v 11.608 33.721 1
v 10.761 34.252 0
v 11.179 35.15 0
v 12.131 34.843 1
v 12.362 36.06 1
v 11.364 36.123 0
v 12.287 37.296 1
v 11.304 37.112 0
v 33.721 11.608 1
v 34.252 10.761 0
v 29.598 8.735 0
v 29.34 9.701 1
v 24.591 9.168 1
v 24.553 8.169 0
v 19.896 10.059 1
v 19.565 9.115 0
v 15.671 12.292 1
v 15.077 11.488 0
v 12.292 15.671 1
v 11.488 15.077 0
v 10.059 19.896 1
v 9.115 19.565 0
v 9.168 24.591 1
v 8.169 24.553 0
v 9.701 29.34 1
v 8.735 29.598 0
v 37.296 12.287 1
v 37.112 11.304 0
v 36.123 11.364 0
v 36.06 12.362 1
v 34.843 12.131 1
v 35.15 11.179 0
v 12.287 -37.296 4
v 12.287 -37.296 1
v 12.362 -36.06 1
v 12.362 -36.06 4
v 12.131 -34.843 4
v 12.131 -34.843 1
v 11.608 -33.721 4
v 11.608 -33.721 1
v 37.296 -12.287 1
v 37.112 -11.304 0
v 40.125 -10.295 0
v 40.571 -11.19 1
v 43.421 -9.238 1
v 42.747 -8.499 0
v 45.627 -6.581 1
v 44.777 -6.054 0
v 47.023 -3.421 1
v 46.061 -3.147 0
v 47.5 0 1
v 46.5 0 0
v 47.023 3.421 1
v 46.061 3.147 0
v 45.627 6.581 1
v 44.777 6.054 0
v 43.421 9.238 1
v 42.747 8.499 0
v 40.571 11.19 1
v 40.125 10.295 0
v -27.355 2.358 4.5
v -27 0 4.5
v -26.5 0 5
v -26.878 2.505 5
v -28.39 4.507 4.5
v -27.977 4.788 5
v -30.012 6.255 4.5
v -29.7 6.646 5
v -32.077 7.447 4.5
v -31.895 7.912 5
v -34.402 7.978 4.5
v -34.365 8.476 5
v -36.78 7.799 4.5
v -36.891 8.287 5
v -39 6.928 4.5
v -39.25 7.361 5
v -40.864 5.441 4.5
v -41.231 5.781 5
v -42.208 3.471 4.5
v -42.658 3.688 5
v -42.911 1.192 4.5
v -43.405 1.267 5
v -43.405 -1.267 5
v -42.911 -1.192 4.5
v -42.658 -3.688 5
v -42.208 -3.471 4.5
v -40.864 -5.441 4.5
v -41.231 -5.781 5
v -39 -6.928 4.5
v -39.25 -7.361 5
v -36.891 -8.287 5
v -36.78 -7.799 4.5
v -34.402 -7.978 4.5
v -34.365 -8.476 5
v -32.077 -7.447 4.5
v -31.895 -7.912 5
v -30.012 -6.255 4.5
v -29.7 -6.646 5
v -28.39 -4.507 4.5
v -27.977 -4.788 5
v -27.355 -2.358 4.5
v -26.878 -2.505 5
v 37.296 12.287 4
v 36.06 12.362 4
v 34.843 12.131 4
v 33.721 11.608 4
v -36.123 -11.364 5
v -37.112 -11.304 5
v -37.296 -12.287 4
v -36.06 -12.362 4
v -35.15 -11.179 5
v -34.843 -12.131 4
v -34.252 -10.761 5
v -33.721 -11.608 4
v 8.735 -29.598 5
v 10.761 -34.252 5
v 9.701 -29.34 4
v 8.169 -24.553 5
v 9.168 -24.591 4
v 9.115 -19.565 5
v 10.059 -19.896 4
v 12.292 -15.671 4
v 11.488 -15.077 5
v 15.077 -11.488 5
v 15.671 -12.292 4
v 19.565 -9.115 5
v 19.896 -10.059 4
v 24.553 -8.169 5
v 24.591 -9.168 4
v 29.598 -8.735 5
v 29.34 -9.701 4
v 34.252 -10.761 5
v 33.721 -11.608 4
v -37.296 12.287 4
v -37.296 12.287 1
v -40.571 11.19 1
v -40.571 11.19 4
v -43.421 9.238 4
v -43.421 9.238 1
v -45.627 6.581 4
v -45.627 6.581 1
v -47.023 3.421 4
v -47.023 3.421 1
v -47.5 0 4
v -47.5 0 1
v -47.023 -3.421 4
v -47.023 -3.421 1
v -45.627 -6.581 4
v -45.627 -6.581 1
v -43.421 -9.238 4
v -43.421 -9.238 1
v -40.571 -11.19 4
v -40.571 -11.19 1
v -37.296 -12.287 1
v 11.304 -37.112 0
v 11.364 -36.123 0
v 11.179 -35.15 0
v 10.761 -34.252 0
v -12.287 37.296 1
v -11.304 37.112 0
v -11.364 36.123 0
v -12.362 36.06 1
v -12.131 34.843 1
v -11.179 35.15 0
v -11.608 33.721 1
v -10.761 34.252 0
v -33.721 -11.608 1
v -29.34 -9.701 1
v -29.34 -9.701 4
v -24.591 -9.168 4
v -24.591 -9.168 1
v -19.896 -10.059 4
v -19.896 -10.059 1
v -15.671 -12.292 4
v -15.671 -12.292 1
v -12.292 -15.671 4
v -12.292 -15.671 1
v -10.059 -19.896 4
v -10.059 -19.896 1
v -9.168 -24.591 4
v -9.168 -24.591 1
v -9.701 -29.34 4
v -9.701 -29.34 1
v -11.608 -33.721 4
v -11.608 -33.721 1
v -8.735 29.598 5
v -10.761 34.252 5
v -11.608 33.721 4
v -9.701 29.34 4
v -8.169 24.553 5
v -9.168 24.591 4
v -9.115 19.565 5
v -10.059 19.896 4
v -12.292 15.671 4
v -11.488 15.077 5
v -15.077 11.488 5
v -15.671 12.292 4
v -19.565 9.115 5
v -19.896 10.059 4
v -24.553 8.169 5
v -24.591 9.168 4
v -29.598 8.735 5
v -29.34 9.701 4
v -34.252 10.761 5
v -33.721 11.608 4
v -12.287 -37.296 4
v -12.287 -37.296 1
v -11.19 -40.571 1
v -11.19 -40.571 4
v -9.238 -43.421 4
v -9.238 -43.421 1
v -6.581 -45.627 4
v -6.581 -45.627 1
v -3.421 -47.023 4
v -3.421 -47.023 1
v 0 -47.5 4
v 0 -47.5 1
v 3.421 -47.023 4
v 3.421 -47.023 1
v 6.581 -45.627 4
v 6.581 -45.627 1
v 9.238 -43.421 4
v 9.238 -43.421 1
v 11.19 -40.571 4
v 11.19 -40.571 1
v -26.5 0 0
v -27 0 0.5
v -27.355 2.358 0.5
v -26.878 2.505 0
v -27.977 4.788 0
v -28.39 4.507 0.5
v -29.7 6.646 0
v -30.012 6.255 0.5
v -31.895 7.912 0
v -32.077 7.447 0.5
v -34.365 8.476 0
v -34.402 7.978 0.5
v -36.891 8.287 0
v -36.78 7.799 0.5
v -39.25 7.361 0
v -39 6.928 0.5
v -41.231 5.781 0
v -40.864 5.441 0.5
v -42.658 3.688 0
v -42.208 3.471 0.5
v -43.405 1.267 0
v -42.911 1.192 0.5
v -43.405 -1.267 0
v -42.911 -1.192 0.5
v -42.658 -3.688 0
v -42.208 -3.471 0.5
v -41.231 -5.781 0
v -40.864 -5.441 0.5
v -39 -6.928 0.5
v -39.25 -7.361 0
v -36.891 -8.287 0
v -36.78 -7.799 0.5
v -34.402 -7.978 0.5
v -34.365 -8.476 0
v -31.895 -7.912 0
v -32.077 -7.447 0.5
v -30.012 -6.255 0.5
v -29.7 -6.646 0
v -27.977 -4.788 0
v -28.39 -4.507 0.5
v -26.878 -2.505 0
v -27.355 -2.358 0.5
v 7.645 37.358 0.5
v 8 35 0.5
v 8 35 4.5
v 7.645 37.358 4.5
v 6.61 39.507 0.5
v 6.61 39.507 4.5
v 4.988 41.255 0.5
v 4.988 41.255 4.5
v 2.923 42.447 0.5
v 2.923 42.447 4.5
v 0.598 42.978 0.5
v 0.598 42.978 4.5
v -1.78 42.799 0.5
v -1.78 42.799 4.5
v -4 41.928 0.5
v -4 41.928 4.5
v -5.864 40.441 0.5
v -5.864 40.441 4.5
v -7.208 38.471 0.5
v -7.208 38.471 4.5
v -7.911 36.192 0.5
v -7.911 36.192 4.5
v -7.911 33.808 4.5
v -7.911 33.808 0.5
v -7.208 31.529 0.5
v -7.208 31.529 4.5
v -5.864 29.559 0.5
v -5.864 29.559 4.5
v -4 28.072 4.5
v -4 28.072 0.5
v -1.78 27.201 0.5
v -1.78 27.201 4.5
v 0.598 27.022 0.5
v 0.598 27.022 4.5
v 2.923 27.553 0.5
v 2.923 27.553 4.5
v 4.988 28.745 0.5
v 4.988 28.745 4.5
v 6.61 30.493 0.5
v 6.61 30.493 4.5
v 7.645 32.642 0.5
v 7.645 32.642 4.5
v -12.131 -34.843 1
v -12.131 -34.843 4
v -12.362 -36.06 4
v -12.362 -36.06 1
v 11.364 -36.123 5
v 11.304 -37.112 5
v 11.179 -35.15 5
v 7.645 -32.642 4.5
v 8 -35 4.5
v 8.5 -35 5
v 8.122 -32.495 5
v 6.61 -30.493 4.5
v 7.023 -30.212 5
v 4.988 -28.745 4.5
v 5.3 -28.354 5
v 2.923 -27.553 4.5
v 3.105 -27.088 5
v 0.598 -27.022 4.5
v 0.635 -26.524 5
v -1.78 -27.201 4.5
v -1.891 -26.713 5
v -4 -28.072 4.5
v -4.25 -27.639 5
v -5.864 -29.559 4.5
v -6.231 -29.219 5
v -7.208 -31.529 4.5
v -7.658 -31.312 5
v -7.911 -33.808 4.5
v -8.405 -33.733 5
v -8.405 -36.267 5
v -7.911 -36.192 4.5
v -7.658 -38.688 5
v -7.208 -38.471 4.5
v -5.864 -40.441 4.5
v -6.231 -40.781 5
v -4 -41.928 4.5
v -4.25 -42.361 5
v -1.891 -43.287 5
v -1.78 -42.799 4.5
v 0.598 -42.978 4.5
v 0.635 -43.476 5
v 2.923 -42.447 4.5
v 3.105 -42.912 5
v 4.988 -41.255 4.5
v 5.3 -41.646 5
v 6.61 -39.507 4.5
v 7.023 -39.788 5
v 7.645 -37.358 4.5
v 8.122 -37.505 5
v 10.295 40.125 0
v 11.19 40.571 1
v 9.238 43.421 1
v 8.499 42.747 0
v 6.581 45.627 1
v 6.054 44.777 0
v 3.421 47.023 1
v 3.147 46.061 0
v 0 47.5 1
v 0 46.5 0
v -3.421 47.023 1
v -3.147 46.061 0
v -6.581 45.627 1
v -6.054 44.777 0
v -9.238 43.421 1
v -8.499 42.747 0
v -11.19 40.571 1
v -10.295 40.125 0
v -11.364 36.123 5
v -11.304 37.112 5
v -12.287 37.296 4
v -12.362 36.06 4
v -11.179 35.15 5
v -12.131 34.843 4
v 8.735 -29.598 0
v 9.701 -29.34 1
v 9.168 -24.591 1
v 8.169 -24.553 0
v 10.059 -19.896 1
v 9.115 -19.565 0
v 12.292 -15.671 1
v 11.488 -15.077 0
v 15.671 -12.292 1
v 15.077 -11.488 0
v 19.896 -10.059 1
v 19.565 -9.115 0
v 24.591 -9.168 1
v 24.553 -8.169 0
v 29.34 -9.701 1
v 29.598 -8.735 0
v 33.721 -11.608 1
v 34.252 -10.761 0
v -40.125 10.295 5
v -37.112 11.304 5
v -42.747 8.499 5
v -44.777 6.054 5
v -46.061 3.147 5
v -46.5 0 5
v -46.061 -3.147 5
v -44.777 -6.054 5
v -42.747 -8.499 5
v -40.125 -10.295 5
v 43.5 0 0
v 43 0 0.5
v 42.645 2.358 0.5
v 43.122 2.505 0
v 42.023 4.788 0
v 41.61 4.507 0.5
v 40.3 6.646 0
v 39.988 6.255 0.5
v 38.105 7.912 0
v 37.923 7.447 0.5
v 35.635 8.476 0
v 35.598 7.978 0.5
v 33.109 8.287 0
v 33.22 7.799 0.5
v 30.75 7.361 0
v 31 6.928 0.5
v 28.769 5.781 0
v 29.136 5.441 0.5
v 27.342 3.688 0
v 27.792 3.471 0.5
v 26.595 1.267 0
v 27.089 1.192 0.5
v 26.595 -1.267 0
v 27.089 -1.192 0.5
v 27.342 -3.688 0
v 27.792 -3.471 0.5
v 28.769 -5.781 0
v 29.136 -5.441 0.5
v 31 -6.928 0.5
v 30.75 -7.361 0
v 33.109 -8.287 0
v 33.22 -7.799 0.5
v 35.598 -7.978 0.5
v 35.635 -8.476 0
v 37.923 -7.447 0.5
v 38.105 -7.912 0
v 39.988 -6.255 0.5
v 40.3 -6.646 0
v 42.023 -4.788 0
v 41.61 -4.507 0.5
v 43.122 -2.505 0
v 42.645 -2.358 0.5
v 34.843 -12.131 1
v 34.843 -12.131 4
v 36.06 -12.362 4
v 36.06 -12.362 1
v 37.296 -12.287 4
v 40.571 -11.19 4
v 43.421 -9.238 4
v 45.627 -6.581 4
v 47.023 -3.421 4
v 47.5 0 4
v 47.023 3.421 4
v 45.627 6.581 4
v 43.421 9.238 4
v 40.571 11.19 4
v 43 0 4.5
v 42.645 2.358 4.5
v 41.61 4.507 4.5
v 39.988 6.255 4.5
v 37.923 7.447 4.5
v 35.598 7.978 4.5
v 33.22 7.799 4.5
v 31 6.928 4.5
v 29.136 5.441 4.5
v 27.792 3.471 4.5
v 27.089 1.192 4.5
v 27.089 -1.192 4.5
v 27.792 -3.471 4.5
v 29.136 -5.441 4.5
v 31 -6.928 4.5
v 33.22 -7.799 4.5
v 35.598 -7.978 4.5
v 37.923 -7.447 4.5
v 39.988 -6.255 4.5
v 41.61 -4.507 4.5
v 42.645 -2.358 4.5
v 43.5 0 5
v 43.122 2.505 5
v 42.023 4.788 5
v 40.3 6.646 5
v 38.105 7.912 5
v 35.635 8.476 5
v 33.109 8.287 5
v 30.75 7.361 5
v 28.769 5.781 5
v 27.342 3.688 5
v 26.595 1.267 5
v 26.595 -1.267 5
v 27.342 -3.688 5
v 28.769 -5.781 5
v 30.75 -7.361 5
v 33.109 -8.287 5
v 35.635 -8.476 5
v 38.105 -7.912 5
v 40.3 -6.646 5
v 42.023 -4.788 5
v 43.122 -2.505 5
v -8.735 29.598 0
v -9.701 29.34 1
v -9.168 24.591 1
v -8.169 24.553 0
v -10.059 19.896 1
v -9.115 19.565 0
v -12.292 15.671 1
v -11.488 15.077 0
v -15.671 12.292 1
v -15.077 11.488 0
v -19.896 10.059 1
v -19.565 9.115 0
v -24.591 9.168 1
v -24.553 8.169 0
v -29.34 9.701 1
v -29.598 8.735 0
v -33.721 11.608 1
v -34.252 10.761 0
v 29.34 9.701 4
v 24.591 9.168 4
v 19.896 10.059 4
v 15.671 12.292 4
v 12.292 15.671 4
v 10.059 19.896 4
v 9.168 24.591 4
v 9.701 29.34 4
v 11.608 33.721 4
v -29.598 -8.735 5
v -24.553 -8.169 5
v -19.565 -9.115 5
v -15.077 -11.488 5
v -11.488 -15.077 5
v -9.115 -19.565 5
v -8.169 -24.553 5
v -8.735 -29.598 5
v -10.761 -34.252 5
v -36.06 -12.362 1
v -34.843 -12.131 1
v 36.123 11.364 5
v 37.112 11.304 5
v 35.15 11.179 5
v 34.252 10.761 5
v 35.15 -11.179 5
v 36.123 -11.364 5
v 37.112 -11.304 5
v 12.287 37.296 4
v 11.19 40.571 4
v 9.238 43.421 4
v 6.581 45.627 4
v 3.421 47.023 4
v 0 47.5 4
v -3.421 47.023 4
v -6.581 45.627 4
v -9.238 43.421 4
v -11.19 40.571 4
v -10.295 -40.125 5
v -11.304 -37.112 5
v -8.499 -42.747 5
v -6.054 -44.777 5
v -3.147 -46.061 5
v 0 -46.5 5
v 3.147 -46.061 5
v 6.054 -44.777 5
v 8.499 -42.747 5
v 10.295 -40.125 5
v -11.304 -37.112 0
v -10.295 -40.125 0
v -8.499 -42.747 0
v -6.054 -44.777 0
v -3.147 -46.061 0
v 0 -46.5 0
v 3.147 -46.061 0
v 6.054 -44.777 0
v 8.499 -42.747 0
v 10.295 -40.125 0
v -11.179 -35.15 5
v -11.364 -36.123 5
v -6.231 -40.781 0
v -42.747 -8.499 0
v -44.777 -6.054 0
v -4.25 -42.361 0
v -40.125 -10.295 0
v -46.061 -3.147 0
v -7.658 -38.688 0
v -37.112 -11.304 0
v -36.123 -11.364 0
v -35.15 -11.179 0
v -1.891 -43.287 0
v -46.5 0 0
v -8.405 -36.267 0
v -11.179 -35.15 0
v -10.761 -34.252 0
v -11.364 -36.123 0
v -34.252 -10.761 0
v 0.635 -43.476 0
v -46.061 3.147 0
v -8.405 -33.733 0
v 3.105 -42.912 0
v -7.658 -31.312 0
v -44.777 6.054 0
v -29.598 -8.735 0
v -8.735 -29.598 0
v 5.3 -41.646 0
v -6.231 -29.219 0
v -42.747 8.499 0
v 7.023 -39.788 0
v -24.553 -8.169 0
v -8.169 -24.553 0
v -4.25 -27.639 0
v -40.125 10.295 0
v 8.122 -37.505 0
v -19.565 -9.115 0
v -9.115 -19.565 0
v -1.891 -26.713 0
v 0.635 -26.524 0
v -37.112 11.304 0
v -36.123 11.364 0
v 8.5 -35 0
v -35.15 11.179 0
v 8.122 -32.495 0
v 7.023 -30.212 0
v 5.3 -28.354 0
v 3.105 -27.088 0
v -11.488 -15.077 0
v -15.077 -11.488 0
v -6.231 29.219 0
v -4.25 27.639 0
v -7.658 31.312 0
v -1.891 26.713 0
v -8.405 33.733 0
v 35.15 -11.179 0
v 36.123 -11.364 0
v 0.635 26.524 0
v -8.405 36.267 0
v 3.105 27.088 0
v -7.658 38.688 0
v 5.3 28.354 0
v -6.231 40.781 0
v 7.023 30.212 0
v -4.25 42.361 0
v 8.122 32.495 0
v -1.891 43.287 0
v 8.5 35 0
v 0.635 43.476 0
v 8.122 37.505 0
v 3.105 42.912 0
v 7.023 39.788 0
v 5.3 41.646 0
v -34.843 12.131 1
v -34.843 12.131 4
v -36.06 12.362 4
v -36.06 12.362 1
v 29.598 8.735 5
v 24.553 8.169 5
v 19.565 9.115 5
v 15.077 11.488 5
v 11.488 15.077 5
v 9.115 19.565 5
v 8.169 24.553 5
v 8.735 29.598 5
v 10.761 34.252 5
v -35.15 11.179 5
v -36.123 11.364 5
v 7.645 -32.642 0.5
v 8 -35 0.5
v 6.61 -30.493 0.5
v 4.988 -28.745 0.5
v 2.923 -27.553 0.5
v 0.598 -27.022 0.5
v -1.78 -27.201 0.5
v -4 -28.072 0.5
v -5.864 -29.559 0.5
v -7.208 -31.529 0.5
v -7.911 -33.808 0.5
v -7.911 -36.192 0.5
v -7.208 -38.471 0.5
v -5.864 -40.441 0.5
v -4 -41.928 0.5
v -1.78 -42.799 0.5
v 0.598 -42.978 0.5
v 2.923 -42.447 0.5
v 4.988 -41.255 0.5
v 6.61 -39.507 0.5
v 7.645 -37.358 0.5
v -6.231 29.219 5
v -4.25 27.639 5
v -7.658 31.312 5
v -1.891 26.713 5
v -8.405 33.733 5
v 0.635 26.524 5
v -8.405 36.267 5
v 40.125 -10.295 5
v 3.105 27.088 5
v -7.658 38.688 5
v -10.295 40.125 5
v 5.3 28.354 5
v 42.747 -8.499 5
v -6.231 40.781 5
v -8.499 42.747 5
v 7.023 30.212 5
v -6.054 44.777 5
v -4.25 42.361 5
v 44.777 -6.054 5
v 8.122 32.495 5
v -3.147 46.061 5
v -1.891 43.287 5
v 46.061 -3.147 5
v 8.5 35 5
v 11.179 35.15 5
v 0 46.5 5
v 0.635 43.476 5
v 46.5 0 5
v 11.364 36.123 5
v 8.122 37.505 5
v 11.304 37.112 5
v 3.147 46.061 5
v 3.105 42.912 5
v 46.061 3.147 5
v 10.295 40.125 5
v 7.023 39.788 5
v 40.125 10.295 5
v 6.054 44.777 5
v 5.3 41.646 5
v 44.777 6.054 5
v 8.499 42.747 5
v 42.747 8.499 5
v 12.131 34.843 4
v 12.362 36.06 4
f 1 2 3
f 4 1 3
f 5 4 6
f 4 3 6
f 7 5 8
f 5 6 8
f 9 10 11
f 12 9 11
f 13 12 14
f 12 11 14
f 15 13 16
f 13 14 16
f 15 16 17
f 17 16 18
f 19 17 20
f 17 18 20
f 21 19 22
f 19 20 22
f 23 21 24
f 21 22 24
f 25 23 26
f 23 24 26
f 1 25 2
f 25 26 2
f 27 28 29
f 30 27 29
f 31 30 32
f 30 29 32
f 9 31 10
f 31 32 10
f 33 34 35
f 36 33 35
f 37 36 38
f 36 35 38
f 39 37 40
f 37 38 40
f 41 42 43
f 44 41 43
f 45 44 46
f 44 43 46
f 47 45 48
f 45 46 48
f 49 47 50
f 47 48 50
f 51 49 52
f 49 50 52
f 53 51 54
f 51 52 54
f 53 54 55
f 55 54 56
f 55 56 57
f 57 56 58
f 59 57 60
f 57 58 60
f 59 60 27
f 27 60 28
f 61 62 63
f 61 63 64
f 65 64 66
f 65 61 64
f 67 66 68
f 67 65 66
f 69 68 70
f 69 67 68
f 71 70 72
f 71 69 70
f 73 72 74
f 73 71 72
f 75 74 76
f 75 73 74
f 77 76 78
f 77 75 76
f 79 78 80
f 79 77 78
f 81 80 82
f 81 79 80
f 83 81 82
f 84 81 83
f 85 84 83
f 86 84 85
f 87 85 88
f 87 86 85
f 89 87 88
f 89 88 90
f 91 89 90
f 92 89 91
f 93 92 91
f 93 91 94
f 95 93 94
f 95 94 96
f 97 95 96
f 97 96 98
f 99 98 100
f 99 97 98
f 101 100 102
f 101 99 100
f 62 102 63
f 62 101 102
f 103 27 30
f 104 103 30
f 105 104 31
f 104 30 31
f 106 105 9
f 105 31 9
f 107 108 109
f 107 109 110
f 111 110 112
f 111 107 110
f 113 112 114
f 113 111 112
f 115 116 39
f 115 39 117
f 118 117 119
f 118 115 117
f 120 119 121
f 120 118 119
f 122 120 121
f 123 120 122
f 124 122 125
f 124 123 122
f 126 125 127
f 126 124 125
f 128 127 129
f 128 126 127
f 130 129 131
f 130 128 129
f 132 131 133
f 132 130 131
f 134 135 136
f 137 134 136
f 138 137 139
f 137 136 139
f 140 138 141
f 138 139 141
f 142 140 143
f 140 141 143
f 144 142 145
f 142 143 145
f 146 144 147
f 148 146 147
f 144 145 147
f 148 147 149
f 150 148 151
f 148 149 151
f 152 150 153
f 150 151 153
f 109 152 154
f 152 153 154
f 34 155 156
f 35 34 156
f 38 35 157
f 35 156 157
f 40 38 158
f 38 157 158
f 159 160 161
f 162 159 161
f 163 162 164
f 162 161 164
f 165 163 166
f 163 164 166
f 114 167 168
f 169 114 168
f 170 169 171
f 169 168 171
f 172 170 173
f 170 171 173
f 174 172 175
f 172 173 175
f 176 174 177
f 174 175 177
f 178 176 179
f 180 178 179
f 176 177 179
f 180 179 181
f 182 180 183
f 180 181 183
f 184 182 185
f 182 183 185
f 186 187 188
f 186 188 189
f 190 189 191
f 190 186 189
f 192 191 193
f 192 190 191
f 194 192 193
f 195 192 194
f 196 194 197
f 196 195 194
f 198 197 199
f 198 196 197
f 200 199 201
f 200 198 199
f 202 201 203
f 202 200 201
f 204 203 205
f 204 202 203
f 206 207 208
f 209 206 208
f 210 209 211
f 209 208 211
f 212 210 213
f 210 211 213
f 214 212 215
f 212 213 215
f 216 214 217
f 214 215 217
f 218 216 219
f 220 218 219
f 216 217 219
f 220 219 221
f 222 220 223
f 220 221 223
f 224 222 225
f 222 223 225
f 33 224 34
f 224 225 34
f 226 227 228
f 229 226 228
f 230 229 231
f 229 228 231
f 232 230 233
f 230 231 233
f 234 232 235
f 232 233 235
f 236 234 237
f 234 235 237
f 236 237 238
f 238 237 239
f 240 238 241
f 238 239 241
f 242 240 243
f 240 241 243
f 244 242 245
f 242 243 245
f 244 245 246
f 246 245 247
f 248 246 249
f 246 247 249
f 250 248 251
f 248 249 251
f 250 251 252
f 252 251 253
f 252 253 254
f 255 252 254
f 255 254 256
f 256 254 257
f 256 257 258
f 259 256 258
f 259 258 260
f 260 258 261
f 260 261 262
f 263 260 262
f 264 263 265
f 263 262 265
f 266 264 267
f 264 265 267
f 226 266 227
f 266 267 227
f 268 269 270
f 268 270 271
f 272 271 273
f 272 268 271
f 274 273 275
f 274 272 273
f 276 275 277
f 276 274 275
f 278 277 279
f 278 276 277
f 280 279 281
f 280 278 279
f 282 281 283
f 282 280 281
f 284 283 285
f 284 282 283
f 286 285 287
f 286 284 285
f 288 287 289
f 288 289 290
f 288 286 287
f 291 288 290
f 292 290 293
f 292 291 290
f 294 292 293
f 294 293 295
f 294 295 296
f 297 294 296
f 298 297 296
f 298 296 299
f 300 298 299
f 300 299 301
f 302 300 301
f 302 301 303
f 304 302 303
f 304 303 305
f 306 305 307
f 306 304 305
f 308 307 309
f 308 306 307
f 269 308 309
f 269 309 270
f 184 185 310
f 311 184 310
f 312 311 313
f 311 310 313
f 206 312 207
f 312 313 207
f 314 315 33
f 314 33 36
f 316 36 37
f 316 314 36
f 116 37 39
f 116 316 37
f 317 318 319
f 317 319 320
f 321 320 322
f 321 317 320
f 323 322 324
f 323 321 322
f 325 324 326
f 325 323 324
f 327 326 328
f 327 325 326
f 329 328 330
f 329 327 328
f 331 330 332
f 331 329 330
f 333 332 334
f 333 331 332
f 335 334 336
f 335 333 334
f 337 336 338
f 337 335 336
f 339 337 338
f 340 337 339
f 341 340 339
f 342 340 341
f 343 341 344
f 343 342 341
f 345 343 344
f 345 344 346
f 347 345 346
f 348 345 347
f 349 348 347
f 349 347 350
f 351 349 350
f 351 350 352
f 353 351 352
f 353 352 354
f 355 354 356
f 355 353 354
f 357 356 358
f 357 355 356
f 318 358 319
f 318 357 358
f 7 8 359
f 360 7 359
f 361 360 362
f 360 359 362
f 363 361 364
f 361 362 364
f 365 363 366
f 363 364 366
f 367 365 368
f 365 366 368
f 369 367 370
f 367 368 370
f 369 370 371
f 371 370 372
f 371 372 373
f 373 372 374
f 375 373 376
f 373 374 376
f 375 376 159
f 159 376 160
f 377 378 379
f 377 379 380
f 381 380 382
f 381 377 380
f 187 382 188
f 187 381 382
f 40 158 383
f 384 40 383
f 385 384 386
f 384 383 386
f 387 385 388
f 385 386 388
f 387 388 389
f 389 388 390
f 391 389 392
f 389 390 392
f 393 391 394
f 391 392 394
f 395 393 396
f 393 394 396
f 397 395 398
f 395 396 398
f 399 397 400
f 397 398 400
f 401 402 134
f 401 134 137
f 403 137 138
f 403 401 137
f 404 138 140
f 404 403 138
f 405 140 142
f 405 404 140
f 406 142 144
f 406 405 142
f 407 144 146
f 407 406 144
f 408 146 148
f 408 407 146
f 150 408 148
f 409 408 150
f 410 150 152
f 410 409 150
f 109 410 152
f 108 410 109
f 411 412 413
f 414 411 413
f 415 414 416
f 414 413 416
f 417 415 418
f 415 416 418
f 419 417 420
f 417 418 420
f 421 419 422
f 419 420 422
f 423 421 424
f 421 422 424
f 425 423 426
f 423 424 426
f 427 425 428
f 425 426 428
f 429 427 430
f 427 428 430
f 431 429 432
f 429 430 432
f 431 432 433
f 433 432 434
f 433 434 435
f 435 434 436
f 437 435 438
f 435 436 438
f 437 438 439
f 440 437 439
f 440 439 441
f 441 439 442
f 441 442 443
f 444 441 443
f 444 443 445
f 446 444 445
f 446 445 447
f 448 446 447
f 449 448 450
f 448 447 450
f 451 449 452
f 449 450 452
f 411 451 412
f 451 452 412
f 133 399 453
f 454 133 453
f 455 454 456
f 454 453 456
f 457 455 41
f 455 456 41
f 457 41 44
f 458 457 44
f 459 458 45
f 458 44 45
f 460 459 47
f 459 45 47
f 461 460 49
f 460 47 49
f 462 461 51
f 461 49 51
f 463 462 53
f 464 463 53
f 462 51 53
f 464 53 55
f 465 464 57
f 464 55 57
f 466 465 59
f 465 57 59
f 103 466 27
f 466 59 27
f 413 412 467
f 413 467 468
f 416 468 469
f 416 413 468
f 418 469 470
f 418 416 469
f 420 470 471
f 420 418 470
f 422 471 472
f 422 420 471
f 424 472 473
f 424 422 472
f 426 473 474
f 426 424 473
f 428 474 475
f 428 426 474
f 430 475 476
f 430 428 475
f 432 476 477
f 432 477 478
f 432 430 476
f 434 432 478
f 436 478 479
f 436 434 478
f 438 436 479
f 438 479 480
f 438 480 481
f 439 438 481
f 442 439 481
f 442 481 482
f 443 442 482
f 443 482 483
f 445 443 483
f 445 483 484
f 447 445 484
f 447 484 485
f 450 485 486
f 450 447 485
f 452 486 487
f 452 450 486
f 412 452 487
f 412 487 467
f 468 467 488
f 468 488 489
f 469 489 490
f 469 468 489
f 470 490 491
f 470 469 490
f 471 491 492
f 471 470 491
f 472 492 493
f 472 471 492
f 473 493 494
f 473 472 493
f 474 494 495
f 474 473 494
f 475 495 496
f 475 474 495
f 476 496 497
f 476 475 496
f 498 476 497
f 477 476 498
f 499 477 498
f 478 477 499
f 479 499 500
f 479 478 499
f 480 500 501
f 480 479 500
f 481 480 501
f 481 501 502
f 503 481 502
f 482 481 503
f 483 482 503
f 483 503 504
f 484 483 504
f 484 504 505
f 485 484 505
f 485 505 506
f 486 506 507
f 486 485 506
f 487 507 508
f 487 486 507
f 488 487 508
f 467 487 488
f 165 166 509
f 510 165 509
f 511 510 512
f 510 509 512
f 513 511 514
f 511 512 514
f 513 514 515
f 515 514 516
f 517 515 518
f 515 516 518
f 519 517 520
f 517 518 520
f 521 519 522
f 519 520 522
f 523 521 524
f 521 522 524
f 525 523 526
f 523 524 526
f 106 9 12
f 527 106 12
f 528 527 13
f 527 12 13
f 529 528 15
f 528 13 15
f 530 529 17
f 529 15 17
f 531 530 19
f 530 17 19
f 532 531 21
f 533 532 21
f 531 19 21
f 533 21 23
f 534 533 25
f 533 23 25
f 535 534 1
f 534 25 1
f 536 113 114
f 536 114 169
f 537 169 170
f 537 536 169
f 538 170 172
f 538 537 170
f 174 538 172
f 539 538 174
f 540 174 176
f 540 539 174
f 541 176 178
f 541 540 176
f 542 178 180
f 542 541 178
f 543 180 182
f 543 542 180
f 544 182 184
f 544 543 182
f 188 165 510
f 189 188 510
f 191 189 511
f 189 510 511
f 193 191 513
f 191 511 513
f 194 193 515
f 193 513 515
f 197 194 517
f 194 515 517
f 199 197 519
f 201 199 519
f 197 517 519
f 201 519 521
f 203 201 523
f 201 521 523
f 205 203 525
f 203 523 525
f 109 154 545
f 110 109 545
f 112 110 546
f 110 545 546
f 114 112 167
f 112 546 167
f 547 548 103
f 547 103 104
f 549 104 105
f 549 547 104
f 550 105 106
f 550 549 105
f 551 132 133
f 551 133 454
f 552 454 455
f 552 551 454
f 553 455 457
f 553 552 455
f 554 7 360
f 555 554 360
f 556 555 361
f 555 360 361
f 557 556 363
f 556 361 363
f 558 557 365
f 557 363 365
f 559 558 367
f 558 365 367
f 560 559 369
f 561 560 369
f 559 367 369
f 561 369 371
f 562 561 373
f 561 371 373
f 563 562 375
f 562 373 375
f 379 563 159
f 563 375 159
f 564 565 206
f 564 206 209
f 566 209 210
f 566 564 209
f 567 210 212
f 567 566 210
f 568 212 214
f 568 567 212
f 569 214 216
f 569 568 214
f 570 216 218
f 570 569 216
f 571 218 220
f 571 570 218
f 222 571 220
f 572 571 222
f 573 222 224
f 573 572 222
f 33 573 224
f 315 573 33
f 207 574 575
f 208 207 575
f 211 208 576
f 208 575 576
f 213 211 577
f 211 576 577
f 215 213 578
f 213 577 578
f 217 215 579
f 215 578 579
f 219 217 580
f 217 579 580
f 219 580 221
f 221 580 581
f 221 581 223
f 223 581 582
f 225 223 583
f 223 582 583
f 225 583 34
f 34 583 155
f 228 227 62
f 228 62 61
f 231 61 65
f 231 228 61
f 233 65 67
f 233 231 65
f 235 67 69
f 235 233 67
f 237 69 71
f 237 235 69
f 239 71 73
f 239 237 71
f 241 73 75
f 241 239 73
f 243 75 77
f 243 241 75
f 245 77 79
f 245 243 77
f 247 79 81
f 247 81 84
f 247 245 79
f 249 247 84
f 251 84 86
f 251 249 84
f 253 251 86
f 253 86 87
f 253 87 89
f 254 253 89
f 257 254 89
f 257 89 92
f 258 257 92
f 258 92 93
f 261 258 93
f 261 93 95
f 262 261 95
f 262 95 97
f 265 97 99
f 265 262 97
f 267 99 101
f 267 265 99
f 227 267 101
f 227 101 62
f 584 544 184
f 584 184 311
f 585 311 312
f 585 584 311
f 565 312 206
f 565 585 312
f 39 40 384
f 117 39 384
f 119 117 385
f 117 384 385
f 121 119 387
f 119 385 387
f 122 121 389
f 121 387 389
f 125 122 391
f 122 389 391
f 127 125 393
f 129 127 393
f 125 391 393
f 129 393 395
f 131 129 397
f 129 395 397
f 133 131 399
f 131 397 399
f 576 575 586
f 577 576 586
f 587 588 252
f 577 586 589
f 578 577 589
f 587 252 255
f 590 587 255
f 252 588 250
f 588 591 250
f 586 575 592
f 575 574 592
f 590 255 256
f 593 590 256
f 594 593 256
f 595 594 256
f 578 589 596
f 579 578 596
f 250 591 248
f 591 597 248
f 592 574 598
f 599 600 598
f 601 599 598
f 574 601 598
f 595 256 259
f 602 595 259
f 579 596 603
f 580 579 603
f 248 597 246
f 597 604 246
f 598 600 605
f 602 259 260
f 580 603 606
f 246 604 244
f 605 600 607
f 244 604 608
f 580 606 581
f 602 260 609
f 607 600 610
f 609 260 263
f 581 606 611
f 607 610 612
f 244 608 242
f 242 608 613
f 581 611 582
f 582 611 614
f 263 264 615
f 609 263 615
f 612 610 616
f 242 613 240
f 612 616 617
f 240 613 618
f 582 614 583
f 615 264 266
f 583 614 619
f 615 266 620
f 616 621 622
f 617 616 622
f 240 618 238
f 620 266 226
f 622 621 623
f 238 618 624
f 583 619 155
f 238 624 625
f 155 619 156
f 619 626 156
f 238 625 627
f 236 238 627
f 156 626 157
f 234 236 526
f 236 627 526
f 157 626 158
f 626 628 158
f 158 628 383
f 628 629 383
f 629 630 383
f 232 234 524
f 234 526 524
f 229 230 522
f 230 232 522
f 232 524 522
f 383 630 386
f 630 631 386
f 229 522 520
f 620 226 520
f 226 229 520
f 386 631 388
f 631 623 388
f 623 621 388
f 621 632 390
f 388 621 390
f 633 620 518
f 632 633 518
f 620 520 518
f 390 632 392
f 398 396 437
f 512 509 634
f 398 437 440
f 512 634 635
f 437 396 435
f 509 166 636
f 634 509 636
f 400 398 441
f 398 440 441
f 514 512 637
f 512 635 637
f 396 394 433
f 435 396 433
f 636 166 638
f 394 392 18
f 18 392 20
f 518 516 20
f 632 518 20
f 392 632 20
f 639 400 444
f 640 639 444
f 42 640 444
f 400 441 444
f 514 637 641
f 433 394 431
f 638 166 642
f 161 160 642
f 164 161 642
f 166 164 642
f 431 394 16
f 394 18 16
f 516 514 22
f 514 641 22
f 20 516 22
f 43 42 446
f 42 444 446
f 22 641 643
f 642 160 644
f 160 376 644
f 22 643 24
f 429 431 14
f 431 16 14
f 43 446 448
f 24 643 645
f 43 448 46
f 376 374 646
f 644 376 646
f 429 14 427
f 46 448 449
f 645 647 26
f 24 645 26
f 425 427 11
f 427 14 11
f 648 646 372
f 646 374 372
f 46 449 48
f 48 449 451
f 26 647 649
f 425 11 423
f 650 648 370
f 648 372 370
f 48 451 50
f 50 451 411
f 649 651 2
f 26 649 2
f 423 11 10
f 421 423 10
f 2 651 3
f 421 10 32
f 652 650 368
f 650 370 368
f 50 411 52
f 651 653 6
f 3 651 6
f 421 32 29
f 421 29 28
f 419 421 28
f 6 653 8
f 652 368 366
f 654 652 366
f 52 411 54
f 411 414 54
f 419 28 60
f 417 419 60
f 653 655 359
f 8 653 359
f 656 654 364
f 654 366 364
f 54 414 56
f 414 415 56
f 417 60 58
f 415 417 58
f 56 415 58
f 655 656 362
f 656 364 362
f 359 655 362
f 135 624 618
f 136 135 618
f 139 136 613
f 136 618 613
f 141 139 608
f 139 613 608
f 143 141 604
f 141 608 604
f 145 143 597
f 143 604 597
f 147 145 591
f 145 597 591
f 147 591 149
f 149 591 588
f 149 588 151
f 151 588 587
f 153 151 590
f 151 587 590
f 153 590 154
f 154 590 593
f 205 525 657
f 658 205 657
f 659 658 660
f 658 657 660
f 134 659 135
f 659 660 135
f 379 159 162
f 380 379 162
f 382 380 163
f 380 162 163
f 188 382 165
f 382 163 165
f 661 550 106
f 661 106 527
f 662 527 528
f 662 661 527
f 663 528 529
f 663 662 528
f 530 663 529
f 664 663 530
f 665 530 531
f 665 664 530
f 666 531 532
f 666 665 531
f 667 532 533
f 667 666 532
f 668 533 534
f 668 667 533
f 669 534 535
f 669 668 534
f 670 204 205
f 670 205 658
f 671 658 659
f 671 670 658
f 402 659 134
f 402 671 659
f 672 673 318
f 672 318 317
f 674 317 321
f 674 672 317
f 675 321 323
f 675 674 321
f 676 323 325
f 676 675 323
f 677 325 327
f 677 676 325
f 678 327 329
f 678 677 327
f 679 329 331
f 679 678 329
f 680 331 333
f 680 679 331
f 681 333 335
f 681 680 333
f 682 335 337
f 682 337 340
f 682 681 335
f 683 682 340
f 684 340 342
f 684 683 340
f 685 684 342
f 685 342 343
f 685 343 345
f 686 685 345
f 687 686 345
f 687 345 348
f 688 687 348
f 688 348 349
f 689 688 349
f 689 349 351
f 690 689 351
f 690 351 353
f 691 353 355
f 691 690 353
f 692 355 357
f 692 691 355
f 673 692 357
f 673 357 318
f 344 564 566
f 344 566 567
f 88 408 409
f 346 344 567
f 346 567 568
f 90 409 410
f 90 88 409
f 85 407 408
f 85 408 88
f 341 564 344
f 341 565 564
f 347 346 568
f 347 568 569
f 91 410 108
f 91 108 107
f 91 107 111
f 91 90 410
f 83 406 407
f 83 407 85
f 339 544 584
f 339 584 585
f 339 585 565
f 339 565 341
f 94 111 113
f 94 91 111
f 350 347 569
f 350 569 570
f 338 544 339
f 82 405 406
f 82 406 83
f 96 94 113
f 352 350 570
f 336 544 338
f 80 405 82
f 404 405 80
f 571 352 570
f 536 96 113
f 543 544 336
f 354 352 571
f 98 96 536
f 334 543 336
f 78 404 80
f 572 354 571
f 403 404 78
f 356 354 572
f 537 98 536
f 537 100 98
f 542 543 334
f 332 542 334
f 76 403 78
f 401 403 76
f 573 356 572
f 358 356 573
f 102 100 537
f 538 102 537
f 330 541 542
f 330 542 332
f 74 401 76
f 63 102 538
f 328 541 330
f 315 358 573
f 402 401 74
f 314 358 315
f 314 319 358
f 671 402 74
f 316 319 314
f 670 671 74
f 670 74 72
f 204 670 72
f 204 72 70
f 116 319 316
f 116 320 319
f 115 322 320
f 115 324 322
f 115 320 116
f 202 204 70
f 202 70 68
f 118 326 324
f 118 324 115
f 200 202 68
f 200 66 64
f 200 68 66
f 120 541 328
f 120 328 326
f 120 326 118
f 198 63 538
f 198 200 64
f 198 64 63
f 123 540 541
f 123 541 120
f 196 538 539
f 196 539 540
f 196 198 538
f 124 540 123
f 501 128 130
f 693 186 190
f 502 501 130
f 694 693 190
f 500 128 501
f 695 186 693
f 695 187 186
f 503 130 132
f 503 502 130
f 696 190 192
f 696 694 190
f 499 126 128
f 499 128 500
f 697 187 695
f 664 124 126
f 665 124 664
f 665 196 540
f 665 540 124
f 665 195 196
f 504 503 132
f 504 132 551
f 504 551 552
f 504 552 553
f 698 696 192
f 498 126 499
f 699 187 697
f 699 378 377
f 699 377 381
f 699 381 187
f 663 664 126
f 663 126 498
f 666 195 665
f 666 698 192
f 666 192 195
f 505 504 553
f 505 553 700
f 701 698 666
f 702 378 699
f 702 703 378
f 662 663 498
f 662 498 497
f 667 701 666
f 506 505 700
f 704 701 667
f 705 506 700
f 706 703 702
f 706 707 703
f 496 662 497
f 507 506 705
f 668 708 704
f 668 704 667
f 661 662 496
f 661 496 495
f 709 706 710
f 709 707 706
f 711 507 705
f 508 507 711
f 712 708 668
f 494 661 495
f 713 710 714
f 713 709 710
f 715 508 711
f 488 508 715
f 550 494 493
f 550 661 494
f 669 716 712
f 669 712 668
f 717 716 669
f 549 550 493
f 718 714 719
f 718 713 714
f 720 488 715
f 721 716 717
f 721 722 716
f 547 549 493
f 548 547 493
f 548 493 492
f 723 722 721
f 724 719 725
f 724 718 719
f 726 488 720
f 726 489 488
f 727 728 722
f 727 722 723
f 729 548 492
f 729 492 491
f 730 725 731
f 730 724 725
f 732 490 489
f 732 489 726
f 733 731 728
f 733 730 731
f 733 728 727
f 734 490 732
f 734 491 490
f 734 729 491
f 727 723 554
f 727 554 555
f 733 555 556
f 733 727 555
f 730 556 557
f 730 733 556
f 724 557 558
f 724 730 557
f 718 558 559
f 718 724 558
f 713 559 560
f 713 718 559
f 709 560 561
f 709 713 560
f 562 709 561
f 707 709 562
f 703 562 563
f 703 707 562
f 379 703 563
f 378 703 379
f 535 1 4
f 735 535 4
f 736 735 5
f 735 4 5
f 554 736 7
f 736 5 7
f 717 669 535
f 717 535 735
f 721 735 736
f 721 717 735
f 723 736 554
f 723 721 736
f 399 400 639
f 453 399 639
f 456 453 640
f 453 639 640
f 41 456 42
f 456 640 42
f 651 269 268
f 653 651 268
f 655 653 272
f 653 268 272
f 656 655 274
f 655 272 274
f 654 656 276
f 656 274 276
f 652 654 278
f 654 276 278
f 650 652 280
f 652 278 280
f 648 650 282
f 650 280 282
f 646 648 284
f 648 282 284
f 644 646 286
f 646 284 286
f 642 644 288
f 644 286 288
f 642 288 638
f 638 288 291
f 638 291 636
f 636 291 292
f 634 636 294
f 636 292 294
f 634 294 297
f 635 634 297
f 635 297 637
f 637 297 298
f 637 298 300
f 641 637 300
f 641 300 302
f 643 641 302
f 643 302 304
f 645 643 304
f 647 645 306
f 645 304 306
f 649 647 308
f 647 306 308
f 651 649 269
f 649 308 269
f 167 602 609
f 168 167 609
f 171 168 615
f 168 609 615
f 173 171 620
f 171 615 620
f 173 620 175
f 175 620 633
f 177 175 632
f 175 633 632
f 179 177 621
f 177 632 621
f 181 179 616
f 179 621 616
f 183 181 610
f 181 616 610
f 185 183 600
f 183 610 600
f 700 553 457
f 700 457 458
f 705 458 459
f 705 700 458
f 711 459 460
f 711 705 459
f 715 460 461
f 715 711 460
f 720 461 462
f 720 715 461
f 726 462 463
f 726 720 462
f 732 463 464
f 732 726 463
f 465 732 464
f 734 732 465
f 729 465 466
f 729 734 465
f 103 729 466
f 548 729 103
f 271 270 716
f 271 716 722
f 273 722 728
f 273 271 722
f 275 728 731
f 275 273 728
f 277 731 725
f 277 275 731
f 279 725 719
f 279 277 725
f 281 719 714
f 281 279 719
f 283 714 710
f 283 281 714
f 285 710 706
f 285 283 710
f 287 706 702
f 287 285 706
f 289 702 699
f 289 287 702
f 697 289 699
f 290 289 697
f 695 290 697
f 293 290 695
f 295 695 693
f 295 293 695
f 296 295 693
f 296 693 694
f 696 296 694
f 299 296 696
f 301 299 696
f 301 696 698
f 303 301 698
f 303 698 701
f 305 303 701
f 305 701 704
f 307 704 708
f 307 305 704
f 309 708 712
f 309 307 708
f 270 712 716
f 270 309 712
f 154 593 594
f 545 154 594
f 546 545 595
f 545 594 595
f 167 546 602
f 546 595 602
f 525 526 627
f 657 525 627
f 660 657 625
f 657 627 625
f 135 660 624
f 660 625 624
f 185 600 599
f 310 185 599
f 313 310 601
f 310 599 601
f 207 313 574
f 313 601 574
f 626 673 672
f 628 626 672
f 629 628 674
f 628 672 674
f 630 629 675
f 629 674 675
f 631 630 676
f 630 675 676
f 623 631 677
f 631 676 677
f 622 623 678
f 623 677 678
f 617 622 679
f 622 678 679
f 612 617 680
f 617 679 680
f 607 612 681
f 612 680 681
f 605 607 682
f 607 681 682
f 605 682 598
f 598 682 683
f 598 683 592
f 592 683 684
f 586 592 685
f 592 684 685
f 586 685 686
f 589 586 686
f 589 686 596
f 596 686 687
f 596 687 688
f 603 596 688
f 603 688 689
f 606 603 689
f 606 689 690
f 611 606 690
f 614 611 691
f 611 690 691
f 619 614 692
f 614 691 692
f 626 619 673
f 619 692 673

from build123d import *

# Parameters (mm, degrees)
F0_R     = 8
F1_DEPTH = 5
F2_SIZE  = 1
F3_SIZE  = 0.5


# Not quite as in the source:
# - a feature names something its author has since deleted; it is built from what else it names


with BuildPart() as f1:
    # F0 (on Top) → F1 (new body)
    with BuildSketch(Plane.XY):
        with BuildLine():
            ThreePointArc((11.6083434008, 33.7208583728), (12.2845984061, 35.4442804748), (12.2873952004, 37.2956304556))
            ThreePointArc((12.2873952004, 37.2956304556), (0, 47.5), (-12.2873952004, 37.2956304556))
            ThreePointArc((-12.2873952004, 37.2956304556), (-12.2845984061, 35.4442804748), (-11.6083434008, 33.7208583728))
            ThreePointArc((-11.6083434008, 33.7208583728), (-13.8553017596, 13.8553017596), (-33.7208583728, 11.6083434008))
            ThreePointArc((-33.7208583728, 11.6083434008), (-35.4442804748, 12.2845984061), (-37.2956304556, 12.2873952004))
            ThreePointArc((-37.2956304556, 12.2873952004), (-47.5, 0), (-37.2956304556, -12.2873952004))
            ThreePointArc((-37.2956304556, -12.2873952004), (-35.4442804748, -12.2845984061), (-33.7208583728, -11.6083434008))
            ThreePointArc((-33.7208583728, -11.6083434008), (-13.8553017596, -13.8553017596), (-11.6083434008, -33.7208583728))
            ThreePointArc((-11.6083434008, -33.7208583728), (-12.2845984061, -35.4442804748), (-12.2873952004, -37.2956304556))
            ThreePointArc((-12.2873952004, -37.2956304556), (0, -47.5), (12.2873952004, -37.2956304556))
            ThreePointArc((12.2873952004, -37.2956304556), (12.2845984061, -35.4442804748), (11.6083434008, -33.7208583728))
            ThreePointArc((11.6083434008, -33.7208583728), (13.8553017596, -13.8553017596), (33.7208583728, -11.6083434008))
            ThreePointArc((33.7208583728, -11.6083434008), (35.4442804748, -12.2845984061), (37.2956304556, -12.2873952004))
            ThreePointArc((37.2956304556, -12.2873952004), (47.5, 0), (37.2956304556, 12.2873952004))
            ThreePointArc((37.2956304556, 12.2873952004), (35.4442804748, 12.2845984061), (33.7208583728, 11.6083434008))
            ThreePointArc((33.7208583728, 11.6083434008), (13.8553017596, 13.8553017596), (11.6083434008, 33.7208583728))
        make_face()
        with Locations((0, -35)):
            Circle(F0_R, mode=Mode.SUBTRACT)
        with Locations((-35, 0)):
            Circle(F0_R, mode=Mode.SUBTRACT)
        with Locations((35, 0)):
            Circle(F0_R, mode=Mode.SUBTRACT)
        with Locations((0, 35)):
            Circle(F0_R, mode=Mode.SUBTRACT)
    extrude(amount=F1_DEPTH)

    # F2
    f2_edges = [f1.edges().sort_by_distance(p)[0] for p in [
        (-47.5, 0, 5),
        (-13.855302, -13.855302, 5),
        (-13.855302, 13.855302, 5),
        (0, 47.5, 5),
        (13.855302, 13.855302, 5),
        (47.5, 0, 5),
        (13.855302, -13.855302, 5),
        (0, -47.5, 5),
        (13.855302, 13.855302, 0),
        (0, 47.5, 0),
        (-13.855302, 13.855302, 0),
        (-47.5, 0, 0),
        (-13.855302, -13.855302, 0),
        (0, -47.5, 0),
        (13.855302, -13.855302, 0),
        (47.5, 0, 0),
    ]]
    chamfer(f2_edges, length=F2_SIZE)

    # F3
    f3_edges = [f1.edges().sort_by_distance(p)[0] for p in [
        (-8, 35, 5),
        (-8, -35, 5),
        (27, 0, 5),
        (-43, 0, 5),
        (-8, 35, 0),
        (-43, 0, 0),
        (27, 0, 0),
        (-8, -35, 0),
    ]]
    chamfer(f3_edges, length=F3_SIZE)


solid = f1.part
